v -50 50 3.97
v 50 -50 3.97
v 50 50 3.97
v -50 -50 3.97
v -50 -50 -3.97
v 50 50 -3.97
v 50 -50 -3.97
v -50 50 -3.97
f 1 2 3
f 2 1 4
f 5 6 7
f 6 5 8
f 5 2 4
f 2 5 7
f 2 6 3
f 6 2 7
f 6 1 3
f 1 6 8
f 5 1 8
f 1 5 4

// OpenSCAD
// Parameters
sheet_length = 100; //[50:200:1]
sheet_width = 100; //[50:200:1]
sheet_thickness = 7.94; //[3.97:15.88:0.01]

// Geometry
module sheet_body() {
  color([0.85, 0.85, 0.8]) // Off-white for 3D printed PLA
  translate([0, 0, 0])
    cube([sheet_length, sheet_width, sheet_thickness], center=true);
}

// Final Output
union() {
  sheet_body();
}
